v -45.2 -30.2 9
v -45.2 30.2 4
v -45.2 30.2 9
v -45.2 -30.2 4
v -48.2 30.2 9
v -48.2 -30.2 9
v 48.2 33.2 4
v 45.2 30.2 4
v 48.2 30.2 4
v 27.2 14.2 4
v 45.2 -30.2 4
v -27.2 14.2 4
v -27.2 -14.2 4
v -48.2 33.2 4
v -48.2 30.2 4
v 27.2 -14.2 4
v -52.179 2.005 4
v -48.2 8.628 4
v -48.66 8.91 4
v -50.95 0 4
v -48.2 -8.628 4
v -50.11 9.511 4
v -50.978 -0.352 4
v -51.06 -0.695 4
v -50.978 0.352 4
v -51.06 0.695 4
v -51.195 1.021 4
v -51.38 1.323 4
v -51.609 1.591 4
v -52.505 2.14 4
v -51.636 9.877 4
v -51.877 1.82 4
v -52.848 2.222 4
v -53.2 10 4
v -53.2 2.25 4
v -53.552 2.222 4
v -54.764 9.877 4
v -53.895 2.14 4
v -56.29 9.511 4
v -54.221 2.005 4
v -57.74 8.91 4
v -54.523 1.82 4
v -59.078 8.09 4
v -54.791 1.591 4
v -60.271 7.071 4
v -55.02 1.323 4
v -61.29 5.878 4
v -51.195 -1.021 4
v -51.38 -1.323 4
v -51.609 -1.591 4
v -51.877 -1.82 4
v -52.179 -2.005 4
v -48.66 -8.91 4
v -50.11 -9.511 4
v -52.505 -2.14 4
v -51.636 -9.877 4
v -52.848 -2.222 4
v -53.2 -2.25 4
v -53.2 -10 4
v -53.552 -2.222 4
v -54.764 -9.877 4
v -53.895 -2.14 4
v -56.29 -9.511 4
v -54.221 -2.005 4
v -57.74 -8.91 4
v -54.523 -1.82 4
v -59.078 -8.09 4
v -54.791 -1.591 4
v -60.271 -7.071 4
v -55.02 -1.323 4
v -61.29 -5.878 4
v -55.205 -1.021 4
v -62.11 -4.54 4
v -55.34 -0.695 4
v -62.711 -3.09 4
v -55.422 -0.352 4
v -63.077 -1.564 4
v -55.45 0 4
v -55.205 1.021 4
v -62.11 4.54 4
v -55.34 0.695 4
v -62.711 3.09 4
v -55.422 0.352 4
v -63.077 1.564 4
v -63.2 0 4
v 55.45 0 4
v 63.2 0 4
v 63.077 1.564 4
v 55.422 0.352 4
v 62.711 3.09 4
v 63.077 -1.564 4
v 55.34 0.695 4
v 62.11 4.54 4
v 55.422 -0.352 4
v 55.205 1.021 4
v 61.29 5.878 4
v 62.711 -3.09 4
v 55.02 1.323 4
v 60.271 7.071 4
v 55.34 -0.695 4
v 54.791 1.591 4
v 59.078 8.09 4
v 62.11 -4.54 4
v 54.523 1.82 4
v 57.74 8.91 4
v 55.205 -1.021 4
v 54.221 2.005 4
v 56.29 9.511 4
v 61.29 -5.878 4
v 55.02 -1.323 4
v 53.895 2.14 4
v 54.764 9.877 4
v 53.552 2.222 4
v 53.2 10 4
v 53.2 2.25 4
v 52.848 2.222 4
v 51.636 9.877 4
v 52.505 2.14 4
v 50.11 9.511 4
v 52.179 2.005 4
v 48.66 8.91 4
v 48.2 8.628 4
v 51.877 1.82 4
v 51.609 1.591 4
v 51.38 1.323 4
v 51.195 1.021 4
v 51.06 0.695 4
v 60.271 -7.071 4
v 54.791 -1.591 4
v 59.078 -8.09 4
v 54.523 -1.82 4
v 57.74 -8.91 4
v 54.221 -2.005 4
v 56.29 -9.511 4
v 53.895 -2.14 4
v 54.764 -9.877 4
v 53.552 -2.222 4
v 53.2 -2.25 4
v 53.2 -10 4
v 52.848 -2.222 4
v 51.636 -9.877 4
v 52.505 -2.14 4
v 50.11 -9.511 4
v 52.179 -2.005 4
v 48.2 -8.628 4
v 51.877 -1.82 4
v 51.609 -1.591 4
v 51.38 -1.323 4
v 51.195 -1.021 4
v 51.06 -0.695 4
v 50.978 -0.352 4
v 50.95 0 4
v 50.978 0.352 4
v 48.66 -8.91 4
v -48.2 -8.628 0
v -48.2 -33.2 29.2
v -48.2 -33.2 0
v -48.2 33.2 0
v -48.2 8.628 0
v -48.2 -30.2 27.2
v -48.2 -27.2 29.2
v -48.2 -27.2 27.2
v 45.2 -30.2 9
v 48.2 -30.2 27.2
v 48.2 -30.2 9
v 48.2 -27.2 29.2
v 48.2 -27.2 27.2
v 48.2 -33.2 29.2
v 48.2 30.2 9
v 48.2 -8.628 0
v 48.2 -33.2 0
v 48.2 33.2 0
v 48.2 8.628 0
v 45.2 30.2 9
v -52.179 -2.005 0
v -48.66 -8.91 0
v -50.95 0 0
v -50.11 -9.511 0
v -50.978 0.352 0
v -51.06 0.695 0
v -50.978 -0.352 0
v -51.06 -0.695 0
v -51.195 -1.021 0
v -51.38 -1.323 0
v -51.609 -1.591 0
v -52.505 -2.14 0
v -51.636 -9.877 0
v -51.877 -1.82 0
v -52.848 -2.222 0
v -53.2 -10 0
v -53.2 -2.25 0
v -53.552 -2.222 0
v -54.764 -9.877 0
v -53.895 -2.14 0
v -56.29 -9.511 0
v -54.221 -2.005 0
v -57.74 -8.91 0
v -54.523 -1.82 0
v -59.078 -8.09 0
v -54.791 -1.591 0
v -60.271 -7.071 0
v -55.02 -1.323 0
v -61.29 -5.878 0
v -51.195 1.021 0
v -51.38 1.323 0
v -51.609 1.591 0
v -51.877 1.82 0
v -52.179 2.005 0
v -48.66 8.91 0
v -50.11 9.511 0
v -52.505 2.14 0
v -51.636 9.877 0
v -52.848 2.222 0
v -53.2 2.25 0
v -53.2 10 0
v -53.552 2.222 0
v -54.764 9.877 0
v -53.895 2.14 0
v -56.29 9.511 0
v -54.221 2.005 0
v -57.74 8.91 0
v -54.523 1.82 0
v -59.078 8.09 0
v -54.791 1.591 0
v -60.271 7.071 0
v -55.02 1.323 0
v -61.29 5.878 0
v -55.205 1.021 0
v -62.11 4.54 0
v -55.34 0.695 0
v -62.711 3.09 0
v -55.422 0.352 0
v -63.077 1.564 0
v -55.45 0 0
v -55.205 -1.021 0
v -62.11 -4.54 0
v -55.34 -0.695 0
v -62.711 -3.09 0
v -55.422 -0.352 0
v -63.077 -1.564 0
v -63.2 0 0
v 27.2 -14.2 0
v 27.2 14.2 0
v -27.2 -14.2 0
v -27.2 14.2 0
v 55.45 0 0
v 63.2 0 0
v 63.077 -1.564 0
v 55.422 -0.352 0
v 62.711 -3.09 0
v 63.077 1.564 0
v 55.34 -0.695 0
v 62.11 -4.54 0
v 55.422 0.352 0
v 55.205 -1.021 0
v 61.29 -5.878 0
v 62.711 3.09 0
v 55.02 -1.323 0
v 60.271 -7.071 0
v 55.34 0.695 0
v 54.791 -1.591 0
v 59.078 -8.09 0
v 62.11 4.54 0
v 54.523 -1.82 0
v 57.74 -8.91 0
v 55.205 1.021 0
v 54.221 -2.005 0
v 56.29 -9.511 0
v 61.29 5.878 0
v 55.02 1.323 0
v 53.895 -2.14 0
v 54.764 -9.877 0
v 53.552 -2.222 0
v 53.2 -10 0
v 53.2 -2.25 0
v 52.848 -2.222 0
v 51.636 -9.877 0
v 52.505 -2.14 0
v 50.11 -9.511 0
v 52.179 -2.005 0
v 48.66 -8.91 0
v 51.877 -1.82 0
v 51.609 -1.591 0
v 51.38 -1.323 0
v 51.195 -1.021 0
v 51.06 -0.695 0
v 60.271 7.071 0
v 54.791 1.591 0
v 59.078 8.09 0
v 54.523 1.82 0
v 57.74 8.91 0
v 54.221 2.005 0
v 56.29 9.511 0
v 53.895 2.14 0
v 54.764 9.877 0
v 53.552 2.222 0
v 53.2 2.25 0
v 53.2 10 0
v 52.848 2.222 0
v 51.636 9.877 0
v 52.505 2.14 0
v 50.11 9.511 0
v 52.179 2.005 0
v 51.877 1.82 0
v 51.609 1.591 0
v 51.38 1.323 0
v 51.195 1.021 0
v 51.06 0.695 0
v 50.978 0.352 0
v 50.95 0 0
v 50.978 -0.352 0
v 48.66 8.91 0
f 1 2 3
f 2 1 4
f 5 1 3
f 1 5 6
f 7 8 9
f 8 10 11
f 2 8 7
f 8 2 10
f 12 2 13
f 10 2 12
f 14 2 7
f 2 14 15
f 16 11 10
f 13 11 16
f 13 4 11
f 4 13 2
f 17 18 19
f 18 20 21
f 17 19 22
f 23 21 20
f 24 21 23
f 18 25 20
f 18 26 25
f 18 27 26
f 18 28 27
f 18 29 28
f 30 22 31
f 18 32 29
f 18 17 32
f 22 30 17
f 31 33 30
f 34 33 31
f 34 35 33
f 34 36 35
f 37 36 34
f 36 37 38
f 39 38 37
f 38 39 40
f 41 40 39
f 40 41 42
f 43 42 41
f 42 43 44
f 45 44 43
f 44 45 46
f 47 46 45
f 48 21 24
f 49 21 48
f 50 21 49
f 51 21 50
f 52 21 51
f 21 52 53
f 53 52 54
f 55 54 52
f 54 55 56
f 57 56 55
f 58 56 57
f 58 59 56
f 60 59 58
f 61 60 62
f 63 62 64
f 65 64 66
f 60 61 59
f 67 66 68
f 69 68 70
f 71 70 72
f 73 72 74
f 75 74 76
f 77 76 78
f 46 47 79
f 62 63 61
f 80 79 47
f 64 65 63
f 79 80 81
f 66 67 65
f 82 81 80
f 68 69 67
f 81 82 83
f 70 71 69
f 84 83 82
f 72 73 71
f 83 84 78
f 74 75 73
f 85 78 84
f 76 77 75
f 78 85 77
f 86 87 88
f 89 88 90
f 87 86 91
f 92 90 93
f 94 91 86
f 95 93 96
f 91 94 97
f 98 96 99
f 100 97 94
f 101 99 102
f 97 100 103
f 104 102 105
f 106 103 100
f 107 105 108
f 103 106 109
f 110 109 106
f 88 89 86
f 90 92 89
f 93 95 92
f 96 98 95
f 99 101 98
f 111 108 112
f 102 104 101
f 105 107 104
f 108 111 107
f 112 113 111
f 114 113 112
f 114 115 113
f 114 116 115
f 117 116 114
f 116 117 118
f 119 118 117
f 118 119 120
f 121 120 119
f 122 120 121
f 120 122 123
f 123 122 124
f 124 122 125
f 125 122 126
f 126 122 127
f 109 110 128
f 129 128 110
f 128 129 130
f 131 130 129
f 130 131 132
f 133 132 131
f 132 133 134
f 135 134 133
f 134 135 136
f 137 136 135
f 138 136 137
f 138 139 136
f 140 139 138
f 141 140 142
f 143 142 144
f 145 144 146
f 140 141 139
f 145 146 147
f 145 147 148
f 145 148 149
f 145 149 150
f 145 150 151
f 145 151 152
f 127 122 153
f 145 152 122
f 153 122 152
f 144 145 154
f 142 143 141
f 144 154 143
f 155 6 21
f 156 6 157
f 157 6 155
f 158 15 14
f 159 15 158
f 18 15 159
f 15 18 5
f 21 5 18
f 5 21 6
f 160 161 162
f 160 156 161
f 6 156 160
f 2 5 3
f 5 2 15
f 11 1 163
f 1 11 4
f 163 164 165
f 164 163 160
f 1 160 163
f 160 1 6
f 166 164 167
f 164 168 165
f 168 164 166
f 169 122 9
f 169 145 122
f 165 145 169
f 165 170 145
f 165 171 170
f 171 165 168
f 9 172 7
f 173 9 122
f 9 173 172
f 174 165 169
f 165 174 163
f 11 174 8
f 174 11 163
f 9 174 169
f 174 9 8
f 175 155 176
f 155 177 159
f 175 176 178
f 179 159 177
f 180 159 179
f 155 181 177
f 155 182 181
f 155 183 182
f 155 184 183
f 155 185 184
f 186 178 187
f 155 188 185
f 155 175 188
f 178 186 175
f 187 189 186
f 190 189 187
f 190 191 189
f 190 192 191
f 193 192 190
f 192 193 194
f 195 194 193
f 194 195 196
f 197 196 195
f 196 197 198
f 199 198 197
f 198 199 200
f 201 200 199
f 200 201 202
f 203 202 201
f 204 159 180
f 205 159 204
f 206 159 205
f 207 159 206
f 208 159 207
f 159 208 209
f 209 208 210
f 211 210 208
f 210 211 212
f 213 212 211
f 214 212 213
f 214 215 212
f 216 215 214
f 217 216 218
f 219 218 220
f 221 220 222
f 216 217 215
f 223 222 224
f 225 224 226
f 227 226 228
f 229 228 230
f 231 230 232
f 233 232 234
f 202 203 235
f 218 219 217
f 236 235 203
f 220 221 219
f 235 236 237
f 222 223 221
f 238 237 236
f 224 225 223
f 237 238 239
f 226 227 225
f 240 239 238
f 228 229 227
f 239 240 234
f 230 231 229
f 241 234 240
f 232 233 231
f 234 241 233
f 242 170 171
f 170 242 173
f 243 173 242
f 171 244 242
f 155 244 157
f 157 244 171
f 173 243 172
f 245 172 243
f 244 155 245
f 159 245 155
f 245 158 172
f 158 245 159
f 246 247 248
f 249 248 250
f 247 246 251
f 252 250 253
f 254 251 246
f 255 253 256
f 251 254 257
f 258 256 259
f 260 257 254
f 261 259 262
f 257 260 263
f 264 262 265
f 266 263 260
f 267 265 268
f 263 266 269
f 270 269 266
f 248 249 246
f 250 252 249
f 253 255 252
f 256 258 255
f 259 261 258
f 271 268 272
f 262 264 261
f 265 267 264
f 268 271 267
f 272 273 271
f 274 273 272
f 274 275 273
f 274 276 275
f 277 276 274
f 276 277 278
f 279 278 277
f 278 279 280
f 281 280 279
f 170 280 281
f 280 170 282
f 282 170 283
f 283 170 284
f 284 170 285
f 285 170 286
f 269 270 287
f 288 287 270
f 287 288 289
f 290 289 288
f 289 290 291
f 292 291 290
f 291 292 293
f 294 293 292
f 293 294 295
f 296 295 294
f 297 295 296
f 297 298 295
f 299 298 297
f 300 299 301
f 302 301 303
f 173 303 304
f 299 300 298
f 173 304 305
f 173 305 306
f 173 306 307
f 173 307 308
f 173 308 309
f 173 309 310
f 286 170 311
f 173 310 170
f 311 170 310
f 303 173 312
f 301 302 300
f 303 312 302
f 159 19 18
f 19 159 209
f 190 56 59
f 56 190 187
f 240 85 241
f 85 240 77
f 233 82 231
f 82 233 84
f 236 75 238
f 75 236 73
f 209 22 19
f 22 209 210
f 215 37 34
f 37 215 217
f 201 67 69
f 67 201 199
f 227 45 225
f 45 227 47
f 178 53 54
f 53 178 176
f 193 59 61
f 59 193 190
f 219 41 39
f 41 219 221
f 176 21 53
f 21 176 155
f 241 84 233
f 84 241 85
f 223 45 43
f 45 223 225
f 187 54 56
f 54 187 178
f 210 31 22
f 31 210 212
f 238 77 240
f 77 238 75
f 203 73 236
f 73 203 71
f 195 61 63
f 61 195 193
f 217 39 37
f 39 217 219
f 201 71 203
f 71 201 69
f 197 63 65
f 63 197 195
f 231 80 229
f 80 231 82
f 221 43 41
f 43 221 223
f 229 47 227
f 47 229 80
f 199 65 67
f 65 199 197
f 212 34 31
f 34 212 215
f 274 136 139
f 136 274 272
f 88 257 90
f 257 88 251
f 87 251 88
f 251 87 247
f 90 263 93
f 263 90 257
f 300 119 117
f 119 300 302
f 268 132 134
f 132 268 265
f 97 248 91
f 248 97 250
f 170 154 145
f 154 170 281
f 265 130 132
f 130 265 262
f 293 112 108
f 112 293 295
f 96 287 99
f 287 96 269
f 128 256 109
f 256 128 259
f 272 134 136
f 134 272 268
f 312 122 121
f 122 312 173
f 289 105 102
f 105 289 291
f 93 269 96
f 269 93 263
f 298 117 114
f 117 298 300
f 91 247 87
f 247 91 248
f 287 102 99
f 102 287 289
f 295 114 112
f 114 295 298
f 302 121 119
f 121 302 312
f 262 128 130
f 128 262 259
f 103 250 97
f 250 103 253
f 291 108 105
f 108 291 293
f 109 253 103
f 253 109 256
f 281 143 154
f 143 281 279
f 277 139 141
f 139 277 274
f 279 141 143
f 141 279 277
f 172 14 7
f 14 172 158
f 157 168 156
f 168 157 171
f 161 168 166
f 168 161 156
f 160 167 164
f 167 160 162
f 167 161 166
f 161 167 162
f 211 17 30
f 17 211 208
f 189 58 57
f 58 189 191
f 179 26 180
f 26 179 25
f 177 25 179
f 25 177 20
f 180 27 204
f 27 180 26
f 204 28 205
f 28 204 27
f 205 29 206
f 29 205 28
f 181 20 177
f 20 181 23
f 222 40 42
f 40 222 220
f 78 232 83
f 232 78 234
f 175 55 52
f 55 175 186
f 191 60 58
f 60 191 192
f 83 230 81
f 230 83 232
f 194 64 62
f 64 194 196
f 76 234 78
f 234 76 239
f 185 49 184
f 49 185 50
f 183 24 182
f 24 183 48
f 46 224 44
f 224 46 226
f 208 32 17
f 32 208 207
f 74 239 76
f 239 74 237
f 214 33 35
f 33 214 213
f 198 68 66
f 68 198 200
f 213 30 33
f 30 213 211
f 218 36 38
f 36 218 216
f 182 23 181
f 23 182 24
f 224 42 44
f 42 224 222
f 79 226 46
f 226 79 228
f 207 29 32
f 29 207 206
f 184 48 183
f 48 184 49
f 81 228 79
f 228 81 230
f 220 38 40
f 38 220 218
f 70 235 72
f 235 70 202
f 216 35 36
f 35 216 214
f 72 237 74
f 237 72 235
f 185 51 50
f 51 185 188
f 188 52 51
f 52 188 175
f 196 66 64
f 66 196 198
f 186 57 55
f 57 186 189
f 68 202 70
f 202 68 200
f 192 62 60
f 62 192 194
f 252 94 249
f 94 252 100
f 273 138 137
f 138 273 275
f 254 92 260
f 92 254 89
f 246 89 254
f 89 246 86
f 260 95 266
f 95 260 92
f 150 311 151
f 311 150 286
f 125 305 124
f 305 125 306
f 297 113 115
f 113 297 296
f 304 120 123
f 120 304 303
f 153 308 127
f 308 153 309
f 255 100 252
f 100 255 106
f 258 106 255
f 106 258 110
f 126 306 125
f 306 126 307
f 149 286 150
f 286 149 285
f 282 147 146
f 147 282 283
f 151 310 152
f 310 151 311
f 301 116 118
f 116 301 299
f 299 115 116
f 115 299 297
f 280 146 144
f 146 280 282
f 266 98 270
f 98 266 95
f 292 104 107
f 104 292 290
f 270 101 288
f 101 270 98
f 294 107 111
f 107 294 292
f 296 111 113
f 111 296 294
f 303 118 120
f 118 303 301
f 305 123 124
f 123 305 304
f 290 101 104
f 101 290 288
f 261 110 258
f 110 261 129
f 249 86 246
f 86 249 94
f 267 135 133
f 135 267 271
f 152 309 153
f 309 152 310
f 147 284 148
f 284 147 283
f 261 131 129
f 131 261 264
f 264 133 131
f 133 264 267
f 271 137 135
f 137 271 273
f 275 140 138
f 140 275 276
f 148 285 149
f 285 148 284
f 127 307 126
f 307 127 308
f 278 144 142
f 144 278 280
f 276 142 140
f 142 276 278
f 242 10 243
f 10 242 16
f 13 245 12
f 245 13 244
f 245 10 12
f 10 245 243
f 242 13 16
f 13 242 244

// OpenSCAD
// file: ../case/case_dimensions.scad
// Shared Piblo case dimensions, in mm; sources/estimates: DIMENSIONS.md.
dev_L = 84.0;
dev_W = 54.0;
dev_T_block = 19.6;
clr = 0.30;
clr_z = 0.30;
wall = 2.4;
floor_t = 1.8;
plate_t = 1.5;
// main file
// Piblo open wall/fridge cradle. UNTESTED: verify retention and fasteners.
include <../case/case_dimensions.scad>
attachment = "screw"; // "screw" or "magnet"; glue magnets into rear pockets.
case_L = dev_L + 2*(clr + wall) + 1;
case_W = dev_W + 2*(clr + wall) + 1;
case_T = dev_T_block + clr_z + plate_t + floor_t;
base_t = 4;
$fn = 40;
difference() {
    union() {
        translate([-case_L/2-3, -case_W/2-3, 0]) cube([case_L+6, case_W+6, base_t]);
        // Shallow side guides leave the case ports open above the back edge.
        for (s = [-1,1]) translate([s*(case_L/2+1.5)-1.5, -case_W/2, base_t])
            cube([3, case_W, 5]);
        translate([-case_L/2-3, -case_W/2-3, base_t]) cube([case_L+6, 3, case_T+2]);
        translate([-case_L/2-3, -case_W/2-3, base_t+case_T]) cube([case_L+6, 6, 2]);
        if (attachment == "screw") for (s = [-1,1])
            translate([s*(case_L/2+8), 0, 0]) cylinder(d=20, h=base_t);
    }
    // Open centre preserves rear airflow.
    translate([-case_L/2+18, -case_W/2+16, -0.1]) cube([case_L-36, case_W-32, base_t+0.2]);
    if (attachment == "screw") for (s = [-1,1])
        translate([s*(case_L/2+8), 0, -0.1]) cylinder(d=4.5, h=base_t+0.2);
    if (attachment == "magnet") for (x = [-1,1], y = [-1,1])
        translate([x*(case_L/2-10), y*(case_W/2-10), -0.1]) cylinder(d=10.3, h=3.2);
}
